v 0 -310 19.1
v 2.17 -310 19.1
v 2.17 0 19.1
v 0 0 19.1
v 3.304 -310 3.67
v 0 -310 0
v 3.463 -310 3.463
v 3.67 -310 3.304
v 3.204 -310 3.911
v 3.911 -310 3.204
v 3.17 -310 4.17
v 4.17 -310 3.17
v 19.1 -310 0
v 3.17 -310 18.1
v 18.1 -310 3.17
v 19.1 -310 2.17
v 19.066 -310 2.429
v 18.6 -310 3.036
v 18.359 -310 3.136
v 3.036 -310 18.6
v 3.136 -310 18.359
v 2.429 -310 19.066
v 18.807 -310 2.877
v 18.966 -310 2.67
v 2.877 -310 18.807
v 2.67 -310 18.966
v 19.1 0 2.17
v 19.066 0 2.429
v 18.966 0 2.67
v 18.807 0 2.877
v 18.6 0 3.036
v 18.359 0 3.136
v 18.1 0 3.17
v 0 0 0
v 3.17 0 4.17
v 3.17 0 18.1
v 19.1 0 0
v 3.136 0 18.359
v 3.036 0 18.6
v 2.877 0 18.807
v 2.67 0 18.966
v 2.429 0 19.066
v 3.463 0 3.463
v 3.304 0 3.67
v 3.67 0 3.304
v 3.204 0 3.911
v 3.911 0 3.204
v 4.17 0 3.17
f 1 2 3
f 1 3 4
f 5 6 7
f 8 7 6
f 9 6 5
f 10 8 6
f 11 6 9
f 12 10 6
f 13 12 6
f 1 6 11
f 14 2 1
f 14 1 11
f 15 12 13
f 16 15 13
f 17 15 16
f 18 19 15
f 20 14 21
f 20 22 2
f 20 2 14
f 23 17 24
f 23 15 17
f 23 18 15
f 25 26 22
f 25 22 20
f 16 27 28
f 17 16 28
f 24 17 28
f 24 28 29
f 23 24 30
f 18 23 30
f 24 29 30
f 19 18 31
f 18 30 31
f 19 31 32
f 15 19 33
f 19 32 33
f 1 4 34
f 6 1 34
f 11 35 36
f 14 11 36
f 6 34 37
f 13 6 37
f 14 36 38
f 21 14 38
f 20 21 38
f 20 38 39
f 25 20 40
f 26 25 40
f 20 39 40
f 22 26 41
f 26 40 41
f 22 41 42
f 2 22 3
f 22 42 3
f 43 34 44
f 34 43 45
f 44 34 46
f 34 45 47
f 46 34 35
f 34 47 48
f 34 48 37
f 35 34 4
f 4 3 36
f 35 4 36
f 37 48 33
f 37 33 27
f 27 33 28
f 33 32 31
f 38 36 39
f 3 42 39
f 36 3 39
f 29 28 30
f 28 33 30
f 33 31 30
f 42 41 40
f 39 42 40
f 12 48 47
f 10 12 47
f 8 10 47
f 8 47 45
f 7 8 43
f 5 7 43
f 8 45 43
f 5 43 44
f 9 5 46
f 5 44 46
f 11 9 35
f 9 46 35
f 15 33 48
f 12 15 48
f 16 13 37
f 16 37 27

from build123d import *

# Parameters (mm, degrees)
F1_DEPTH = 310


with BuildPart() as f1:
    # F0 (on Front) → F1 (new body)
    with BuildSketch(Plane.XZ):
        with BuildLine():
            Line((2.17, 19.1), (0, 19.1))
            Line((0, 19.1), (0, 0))
            Line((0, 0), (19.1, 0))
            Line((19.1, 0), (19.1, 2.17))
            ThreePointArc((19.1, 2.17), (18.807107, 2.877107), (18.1, 3.17))
            Line((18.1, 3.17), (4.17, 3.17))
            ThreePointArc((4.17, 3.17), (3.462893, 3.462893), (3.17, 4.17))
            Line((3.17, 4.17), (3.17, 18.1))
            ThreePointArc((3.17, 18.1), (2.877107, 18.807107), (2.17, 19.1))
        make_face()
    extrude(amount=F1_DEPTH)


solid = f1.part
